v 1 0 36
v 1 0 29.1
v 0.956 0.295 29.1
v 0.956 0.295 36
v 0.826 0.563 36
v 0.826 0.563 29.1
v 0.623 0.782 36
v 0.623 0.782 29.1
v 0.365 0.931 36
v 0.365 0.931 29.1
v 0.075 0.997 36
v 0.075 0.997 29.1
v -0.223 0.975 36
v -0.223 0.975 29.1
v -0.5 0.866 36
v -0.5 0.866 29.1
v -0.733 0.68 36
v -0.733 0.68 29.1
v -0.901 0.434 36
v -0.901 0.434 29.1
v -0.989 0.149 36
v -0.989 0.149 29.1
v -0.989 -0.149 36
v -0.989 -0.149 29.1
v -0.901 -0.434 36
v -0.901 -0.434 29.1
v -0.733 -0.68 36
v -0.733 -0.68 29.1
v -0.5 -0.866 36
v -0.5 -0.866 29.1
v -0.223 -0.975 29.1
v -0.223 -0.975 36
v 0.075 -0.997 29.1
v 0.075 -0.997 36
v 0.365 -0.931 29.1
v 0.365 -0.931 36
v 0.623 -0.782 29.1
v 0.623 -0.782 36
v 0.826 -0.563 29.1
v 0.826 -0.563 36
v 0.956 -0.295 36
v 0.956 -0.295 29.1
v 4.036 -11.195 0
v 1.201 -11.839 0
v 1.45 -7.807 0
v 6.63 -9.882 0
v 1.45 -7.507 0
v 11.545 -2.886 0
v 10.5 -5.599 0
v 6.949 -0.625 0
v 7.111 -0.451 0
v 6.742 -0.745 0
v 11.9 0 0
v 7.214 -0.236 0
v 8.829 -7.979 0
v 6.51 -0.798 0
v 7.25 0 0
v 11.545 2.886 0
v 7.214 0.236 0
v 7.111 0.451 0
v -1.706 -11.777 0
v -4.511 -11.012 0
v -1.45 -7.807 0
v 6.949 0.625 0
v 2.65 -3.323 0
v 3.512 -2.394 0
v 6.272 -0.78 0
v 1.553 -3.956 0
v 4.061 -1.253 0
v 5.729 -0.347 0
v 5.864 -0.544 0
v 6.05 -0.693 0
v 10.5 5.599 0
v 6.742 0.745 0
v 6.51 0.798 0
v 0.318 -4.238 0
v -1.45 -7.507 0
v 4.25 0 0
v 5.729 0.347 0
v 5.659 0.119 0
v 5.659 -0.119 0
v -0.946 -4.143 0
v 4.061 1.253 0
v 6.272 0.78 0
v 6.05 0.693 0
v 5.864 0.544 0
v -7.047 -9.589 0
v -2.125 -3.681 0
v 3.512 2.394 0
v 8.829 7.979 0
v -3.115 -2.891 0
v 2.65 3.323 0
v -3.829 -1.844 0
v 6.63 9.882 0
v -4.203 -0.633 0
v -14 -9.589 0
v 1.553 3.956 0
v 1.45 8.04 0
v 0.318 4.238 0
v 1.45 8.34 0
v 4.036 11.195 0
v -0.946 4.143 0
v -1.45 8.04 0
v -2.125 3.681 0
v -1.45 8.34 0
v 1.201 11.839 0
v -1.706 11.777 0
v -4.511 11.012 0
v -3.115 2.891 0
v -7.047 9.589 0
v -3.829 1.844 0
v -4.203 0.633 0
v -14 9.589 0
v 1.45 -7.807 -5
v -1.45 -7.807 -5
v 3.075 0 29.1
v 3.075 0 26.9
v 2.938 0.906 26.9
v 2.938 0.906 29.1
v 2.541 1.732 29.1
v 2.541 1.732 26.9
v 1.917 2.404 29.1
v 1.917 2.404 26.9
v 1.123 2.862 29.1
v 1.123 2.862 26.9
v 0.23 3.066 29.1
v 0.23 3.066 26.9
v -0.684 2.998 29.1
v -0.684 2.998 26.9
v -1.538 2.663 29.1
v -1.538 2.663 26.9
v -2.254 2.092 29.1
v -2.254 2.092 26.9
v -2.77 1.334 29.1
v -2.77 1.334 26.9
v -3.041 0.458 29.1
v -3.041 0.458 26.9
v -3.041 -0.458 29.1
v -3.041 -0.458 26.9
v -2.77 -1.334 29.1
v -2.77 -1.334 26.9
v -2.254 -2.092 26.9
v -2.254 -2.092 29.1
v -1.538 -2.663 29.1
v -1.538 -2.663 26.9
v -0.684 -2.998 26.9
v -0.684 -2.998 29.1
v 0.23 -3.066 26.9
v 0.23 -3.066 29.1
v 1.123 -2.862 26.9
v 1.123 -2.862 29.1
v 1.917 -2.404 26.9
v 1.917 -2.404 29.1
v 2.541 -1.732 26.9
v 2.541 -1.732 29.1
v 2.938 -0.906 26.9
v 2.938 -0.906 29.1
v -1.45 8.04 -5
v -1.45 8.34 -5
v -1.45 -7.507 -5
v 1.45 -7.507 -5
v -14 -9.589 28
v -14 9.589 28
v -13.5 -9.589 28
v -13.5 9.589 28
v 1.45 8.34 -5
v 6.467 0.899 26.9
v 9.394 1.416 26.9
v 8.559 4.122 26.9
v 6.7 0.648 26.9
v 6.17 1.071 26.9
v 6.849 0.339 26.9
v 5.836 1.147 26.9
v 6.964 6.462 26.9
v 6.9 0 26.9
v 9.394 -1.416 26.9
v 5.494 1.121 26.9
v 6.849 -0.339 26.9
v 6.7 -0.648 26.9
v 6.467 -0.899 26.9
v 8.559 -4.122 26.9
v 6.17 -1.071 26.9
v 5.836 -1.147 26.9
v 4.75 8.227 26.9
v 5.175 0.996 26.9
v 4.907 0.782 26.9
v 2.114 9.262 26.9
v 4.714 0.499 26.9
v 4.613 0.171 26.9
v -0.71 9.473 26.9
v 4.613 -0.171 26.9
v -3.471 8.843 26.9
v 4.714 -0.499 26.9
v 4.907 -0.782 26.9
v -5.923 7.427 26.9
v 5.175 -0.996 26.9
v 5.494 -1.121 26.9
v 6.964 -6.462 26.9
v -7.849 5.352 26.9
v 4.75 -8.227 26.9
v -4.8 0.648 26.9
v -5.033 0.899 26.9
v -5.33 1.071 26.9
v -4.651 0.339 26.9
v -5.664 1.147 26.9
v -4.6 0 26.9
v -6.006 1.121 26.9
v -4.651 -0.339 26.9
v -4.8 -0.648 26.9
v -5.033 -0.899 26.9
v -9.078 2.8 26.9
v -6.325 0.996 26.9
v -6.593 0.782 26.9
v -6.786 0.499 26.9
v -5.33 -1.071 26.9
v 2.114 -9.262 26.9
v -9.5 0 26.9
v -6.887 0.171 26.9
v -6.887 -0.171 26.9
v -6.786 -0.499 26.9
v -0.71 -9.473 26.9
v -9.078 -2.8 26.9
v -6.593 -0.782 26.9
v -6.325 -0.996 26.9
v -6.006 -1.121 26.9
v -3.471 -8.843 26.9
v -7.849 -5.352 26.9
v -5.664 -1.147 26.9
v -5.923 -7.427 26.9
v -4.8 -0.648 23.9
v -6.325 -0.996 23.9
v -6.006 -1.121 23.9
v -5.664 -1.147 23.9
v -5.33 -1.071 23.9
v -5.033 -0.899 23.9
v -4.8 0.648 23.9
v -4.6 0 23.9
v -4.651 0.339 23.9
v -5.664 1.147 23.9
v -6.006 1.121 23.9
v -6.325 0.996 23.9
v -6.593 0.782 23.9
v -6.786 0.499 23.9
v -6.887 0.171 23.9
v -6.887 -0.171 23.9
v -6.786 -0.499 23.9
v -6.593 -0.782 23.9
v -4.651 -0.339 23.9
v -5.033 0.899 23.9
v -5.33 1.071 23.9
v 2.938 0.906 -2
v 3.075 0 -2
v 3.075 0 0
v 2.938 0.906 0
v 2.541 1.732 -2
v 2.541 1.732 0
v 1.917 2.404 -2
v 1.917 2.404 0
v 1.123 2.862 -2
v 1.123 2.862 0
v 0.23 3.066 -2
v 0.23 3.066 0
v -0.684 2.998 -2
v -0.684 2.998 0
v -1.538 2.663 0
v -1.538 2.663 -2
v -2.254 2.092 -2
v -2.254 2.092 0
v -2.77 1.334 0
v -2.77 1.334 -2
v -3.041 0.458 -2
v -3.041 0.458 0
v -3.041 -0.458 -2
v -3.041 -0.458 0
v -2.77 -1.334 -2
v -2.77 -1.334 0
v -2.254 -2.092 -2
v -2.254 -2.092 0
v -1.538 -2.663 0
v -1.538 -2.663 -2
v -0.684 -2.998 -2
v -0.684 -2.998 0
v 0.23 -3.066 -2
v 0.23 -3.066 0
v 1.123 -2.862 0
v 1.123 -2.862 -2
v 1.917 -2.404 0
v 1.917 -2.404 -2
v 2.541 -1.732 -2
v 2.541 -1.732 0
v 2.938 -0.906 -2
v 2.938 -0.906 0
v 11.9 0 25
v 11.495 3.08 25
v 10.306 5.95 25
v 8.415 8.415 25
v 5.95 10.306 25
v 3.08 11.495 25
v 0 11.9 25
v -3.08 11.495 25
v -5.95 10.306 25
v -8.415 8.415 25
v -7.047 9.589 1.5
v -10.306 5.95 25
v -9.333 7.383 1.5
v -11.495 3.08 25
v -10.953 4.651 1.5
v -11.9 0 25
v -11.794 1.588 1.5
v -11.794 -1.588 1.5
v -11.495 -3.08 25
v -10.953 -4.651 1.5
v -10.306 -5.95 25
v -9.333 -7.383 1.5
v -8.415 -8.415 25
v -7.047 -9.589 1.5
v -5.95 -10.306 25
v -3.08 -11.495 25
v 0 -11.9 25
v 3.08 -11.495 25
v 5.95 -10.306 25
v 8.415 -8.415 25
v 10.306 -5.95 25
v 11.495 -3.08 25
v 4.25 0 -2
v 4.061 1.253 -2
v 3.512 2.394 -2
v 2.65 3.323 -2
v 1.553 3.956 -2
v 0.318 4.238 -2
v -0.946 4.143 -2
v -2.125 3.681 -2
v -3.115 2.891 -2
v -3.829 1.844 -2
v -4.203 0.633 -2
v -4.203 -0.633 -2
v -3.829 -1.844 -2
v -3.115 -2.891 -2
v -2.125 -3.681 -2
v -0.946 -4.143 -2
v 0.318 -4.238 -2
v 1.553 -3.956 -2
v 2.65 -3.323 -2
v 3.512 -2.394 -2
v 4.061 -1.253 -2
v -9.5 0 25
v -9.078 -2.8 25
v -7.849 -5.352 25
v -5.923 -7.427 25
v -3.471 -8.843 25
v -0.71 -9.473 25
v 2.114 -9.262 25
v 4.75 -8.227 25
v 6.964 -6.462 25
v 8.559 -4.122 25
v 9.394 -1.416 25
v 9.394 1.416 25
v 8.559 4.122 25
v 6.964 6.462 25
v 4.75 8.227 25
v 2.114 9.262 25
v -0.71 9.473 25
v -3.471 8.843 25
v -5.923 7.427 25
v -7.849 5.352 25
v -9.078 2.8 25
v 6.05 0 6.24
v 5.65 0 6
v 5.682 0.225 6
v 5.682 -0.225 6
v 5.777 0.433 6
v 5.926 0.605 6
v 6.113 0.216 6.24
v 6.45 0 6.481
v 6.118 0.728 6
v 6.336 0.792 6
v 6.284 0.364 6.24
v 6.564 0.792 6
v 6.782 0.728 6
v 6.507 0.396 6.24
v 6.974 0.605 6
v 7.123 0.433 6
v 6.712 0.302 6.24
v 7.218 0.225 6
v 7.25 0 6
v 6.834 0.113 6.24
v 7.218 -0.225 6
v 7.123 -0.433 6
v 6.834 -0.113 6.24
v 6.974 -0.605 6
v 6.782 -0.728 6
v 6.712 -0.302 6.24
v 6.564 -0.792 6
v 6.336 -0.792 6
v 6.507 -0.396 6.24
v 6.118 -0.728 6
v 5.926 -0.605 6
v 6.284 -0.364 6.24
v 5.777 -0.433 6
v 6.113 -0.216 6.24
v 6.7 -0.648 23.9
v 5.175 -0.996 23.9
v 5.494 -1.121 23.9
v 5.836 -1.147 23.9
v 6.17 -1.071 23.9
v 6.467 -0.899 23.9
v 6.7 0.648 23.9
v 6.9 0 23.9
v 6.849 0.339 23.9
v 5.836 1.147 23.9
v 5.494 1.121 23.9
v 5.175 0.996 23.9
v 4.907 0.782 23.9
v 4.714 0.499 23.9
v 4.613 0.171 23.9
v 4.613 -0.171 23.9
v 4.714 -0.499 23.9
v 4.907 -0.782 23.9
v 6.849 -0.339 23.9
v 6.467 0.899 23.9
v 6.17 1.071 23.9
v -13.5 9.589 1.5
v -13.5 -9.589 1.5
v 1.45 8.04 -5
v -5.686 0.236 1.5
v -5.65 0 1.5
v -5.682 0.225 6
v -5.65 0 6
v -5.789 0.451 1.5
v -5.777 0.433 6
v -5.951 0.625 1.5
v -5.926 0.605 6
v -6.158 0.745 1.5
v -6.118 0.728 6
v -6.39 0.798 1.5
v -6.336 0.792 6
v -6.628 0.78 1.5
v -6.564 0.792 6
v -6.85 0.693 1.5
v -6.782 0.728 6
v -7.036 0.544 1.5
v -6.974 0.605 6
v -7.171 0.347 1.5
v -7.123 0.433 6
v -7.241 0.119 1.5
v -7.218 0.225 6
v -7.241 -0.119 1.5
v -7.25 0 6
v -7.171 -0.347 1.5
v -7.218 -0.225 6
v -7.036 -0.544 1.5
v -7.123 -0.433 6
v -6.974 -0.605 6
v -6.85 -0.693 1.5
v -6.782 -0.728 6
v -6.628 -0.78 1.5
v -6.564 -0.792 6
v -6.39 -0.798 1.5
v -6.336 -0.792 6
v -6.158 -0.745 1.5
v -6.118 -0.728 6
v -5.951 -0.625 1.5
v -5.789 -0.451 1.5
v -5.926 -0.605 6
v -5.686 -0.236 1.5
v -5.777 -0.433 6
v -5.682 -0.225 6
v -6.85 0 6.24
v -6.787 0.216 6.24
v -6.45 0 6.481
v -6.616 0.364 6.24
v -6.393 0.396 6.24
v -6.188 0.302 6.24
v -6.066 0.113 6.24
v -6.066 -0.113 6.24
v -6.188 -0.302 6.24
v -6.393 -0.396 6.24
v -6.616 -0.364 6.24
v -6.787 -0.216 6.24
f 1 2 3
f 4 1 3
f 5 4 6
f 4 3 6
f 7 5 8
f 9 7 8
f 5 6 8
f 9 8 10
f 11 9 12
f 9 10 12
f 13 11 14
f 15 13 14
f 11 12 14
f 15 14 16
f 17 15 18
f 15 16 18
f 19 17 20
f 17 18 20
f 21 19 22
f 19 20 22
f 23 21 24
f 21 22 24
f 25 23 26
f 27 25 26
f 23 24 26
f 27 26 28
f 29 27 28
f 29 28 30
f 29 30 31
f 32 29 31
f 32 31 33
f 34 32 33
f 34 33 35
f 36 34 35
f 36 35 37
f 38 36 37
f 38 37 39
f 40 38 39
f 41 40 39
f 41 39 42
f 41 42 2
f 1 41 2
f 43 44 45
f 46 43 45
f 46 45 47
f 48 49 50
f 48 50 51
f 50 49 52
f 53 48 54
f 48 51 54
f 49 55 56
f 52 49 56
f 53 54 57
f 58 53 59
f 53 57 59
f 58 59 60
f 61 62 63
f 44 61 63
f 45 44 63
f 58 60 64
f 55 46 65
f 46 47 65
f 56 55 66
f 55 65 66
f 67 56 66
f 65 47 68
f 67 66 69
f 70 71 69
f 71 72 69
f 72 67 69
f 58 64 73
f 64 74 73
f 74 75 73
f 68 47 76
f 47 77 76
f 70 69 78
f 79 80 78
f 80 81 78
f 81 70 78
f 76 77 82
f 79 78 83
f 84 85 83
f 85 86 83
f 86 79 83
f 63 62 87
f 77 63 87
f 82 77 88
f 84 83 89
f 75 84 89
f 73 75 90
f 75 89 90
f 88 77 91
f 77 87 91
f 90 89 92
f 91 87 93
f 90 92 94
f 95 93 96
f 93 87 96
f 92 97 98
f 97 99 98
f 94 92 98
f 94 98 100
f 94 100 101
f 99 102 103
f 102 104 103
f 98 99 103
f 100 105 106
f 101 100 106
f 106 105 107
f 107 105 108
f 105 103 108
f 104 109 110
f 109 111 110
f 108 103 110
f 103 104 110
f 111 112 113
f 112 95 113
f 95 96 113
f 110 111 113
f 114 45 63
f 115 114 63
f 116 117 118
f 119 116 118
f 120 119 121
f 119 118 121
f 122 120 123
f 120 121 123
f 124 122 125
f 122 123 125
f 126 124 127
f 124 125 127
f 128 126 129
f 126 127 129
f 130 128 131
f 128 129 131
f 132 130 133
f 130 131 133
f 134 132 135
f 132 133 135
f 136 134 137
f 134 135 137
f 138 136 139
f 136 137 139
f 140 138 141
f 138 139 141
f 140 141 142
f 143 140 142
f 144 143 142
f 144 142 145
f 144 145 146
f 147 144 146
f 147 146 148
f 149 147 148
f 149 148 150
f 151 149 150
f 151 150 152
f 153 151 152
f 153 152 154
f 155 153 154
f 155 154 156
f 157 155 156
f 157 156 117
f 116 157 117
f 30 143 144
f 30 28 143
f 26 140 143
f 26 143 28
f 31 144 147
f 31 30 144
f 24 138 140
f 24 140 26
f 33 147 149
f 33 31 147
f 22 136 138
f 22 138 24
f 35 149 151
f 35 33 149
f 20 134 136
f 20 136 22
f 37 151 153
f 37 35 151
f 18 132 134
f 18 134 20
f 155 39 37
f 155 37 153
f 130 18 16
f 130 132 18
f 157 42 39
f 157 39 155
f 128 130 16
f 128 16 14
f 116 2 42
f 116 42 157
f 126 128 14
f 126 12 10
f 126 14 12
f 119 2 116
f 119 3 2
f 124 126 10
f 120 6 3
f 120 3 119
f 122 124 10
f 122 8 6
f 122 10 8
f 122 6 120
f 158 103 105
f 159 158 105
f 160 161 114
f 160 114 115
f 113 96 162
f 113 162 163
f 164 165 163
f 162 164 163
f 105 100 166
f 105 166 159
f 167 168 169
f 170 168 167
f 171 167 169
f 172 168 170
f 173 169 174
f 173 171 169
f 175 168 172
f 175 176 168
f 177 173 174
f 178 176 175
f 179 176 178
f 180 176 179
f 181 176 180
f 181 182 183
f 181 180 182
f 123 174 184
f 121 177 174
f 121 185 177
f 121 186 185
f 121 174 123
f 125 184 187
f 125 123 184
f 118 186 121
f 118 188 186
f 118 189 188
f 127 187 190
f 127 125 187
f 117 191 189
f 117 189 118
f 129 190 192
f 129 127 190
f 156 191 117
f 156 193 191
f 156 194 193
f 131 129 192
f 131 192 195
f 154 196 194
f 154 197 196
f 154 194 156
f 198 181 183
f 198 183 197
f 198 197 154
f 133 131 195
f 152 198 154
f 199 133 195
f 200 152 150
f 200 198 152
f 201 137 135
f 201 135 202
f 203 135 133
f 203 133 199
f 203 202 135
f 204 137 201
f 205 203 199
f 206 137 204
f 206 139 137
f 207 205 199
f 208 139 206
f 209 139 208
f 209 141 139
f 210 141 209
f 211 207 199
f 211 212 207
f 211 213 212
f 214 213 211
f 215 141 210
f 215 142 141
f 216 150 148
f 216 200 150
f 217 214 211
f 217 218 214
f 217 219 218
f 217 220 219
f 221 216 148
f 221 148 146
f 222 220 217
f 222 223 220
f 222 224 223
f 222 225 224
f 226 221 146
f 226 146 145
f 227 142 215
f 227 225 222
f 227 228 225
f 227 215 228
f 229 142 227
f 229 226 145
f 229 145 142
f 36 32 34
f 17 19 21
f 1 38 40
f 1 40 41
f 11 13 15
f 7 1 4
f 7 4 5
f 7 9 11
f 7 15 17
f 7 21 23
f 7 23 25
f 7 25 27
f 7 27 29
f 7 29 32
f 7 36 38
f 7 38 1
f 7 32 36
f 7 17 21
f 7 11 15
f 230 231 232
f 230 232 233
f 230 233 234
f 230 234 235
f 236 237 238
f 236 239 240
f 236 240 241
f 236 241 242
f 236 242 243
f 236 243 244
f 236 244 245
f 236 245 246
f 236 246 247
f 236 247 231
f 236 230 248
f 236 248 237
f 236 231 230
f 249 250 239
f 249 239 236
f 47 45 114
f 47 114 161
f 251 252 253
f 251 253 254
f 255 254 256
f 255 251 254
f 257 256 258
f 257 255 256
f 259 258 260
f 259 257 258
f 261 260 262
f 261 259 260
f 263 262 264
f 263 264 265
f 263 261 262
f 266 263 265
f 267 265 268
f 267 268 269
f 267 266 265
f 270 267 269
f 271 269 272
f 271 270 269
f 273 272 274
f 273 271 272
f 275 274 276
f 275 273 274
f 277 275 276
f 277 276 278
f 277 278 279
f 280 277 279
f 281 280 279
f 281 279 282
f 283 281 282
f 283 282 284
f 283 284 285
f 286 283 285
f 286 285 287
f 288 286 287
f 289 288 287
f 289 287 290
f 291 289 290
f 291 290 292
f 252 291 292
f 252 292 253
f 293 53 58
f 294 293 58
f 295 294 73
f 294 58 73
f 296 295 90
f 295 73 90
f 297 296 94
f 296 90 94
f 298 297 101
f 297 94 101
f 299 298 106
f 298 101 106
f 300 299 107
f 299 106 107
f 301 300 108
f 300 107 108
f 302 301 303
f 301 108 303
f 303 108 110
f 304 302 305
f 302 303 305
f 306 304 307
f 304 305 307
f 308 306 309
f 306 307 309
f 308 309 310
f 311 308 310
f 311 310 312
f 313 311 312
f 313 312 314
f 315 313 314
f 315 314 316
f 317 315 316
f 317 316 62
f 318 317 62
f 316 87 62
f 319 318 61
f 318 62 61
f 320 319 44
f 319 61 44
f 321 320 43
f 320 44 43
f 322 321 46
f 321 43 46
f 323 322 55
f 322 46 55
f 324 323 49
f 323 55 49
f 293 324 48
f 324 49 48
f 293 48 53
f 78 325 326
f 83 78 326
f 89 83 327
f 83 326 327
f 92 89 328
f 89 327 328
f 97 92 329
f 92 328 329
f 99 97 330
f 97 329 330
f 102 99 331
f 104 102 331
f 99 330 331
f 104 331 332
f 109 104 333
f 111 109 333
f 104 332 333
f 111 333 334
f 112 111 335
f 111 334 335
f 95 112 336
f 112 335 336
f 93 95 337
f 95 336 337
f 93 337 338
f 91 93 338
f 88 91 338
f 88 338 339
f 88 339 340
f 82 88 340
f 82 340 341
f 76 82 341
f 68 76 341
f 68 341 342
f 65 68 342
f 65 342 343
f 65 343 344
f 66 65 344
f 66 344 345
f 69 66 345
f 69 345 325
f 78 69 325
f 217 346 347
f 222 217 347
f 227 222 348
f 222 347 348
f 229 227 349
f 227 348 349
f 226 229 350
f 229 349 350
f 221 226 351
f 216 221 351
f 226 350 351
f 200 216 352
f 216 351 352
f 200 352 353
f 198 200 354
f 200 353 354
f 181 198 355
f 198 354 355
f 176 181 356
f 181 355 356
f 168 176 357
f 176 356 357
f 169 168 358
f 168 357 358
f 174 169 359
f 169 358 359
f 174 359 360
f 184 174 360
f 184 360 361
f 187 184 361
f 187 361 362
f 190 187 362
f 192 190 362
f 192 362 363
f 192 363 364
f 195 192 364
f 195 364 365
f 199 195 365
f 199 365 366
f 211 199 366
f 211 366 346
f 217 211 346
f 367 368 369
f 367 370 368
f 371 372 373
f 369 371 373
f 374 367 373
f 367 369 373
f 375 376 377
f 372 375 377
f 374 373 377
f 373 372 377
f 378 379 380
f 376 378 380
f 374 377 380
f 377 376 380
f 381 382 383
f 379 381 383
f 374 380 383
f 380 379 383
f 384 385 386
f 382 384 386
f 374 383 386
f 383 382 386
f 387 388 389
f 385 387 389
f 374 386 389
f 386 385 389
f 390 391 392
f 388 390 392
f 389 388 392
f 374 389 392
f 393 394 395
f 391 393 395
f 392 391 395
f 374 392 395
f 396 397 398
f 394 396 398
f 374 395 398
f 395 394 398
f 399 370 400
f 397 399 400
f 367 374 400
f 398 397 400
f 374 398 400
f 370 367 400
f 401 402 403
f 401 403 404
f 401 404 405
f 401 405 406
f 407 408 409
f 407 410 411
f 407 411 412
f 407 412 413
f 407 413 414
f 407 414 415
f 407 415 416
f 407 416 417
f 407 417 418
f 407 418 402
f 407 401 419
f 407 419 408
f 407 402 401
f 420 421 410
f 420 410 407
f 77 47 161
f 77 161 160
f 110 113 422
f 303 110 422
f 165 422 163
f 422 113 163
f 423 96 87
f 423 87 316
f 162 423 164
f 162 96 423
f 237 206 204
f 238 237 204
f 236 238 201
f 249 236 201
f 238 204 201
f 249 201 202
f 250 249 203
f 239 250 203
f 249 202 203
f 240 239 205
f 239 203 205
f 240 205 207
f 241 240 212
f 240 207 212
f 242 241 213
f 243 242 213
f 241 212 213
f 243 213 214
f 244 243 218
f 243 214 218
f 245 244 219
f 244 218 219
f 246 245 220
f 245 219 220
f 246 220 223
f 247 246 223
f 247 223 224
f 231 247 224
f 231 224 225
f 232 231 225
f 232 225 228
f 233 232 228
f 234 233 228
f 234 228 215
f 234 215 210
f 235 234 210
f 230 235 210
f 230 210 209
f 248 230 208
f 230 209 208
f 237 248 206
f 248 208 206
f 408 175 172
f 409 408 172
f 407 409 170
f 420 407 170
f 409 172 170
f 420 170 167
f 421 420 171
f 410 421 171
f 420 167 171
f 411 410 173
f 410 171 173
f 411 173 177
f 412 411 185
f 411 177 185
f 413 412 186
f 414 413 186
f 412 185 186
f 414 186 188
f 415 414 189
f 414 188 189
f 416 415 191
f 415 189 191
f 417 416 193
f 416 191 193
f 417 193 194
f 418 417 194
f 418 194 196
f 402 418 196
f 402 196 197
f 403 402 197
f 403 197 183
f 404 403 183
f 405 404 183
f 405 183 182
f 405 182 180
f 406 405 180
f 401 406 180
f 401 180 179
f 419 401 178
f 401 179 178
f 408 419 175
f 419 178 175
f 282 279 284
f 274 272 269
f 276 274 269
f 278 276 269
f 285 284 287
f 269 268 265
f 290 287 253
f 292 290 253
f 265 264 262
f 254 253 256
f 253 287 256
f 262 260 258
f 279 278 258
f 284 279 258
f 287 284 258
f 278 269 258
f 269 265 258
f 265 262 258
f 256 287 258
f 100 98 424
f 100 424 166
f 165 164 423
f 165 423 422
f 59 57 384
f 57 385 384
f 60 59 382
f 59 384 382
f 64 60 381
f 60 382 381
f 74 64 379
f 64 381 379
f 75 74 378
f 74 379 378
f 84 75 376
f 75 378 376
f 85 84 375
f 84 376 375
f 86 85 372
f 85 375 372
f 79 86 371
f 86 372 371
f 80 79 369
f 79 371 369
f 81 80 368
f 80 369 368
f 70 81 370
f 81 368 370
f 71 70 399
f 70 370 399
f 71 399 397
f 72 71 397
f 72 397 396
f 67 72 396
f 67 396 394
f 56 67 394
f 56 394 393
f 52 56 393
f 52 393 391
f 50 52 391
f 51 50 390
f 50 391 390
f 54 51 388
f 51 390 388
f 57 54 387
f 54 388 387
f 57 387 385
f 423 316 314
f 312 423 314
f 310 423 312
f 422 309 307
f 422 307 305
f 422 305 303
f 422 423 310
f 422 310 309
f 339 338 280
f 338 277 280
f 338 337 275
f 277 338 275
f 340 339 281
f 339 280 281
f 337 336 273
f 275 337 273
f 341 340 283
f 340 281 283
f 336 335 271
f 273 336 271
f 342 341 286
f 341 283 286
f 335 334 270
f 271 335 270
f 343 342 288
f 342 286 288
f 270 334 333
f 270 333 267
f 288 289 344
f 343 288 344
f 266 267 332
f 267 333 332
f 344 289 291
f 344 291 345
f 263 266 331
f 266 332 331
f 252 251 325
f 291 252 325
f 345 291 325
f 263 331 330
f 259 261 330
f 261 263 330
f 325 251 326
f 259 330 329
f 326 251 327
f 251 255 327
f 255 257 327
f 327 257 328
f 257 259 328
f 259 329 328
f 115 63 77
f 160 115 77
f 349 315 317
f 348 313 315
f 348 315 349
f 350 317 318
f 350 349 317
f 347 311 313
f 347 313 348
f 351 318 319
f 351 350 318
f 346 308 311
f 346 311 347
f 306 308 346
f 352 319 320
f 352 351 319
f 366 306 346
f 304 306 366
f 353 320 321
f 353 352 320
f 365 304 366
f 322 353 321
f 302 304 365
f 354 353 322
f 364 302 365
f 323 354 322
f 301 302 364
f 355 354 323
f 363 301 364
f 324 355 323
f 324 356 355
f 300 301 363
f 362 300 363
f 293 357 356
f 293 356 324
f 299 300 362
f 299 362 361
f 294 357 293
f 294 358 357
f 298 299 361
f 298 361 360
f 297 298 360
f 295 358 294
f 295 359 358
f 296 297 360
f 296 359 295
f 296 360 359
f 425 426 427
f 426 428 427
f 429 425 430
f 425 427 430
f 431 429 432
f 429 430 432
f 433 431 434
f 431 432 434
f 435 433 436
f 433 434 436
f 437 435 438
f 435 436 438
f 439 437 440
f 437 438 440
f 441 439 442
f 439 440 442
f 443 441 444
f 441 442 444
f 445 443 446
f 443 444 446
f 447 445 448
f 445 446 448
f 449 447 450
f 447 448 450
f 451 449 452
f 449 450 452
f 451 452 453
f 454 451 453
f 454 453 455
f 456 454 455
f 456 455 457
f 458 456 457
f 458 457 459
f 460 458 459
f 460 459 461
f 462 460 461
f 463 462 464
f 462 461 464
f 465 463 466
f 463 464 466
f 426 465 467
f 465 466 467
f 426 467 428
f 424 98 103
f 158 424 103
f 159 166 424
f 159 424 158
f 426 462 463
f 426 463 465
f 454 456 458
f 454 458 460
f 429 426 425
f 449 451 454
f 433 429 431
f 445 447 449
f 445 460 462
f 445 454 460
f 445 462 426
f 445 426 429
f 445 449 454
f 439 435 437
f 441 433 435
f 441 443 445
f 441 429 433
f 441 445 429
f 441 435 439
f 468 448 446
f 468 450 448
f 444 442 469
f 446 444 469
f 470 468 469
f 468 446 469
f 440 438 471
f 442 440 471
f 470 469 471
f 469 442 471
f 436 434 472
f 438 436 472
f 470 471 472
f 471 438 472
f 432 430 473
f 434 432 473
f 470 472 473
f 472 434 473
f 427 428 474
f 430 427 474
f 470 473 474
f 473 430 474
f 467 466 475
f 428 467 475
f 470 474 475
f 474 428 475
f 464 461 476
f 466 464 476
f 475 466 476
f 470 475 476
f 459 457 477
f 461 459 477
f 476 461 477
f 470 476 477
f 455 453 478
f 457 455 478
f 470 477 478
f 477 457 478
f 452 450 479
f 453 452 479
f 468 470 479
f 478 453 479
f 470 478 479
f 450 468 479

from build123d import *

# Parameters (mm, degrees)
SKETCH_2_R             = 1
EXTRUDE_1_DEPTH        = 36
SKETCH_2_4_R           = 3.075
SKETCH_2_4_R_2         = 1
EXTRUDE_2_DEPTH        = 29.1
EXTRUDE_3_DEPTH        = 26.9
EXTRUDE_3_DEPTH_BACK   = 2
SKETCH_2_5_R           = 4.25
SKETCH_2_5_R_2         = 3.075
SKETCH_2_6_R           = 9.5
SKETCH_2_6_R_2         = 4.25
EXTRUDE_4_DEPTH        = 26.9
SKETCH_2_7_R           = 11.9
SKETCH_2_7_R_2         = 9.5
EXTRUDE_5_DEPTH        = 25
SKETCH_5_W             = 2.9
SKETCH_5_H             = 0.3
EXTRUDE_6_DEPTH        = 5
HOLE_WIZARD_M2_2_D     = 1.6
HOLE_WIZARD_M2_2_DEPTH = 6
HOLE_WIZARD_M2_2_TIP   = 0.480688495
SKETCH_14_R            = 1.15
CUT_EXTRUDE_1_DEPTH    = 3
SKETCH_15_W            = 0.5
SKETCH_15_H            = 19.17801297
EXTRUDE_7_DEPTH        = 28
SKETCH_17_W            = 1.5
SKETCH_17_H            = 19.17801297
EXTRUDE_9_DEPTH        = 10


with BuildPart() as part:
    # ｽｹｯﾁ2 → ﾎﾞｽ - 押し出し1 (new body)
    with BuildSketch(Plane.XY):
        Circle(SKETCH_2_R)
    extrude(amount=EXTRUDE_1_DEPTH)

    # ｽｹｯﾁ2<4> → ﾎﾞｽ - 押し出し2 (add)
    with BuildSketch(Plane.XY):
        Circle(SKETCH_2_4_R)
        Circle(SKETCH_2_4_R_2, mode=Mode.SUBTRACT)
    extrude(amount=EXTRUDE_2_DEPTH)

    # ｽｹｯﾁ2<5> → ﾎﾞｽ - 押し出し3 (add, two sides: drawn at the far end of the back side and taken through both)
    with BuildSketch(Plane.XY.offset(-EXTRUDE_3_DEPTH_BACK)):
        Circle(SKETCH_2_5_R)
        Circle(SKETCH_2_5_R_2, mode=Mode.SUBTRACT)
    extrude(amount=EXTRUDE_3_DEPTH + EXTRUDE_3_DEPTH_BACK)

    # ｽｹｯﾁ2<6> → ﾎﾞｽ - 押し出し4 (add)
    with BuildSketch(Plane.XY):
        Circle(SKETCH_2_6_R)
        Circle(SKETCH_2_6_R_2, mode=Mode.SUBTRACT)
    extrude(amount=EXTRUDE_4_DEPTH)

    # ｽｹｯﾁ2<7> → ﾎﾞｽ - 押し出し5 (add)
    with BuildSketch(Plane.XY):
        Circle(SKETCH_2_7_R)
        Circle(SKETCH_2_7_R_2, mode=Mode.SUBTRACT)
    extrude(amount=EXTRUDE_5_DEPTH)

    # ｽｹｯﾁ5 → ﾎﾞｽ - 押し出し6 (add)
    with BuildSketch(Plane(origin=(0, 0, 0), x_dir=(-1, 0, 0), z_dir=(0, 0, -1))):
        with Locations((0, -7.656829655)):
            Rectangle(SKETCH_5_W, SKETCH_5_H)
        with Locations((0, 8.189714354)):
            Rectangle(SKETCH_5_W, SKETCH_5_H)
    extrude(amount=EXTRUDE_6_DEPTH)

    # M2 ねじ穴2
    with Locations(Plane(origin=(0, 0, 0), x_dir=(-1, 0, 0), z_dir=(0, 0, -1))):
        with Locations((-6.45, 0), (6.45, 0)):
            Hole(HOLE_WIZARD_M2_2_D / 2, depth=HOLE_WIZARD_M2_2_DEPTH)
            with Locations((0, 0, -(HOLE_WIZARD_M2_2_DEPTH + HOLE_WIZARD_M2_2_TIP / 2))):  # 118° drill point
                Cone(0, HOLE_WIZARD_M2_2_D / 2, HOLE_WIZARD_M2_2_TIP, mode=Mode.SUBTRACT)

    # ｽｹｯﾁ14 → ｶｯﾄ - 押し出し1 (cut)
    with BuildSketch(Plane.XY.offset(26.9)):
        with Locations((5.75, 0)):
            Circle(SKETCH_14_R)
        with Locations((-5.75, 0)):
            Circle(SKETCH_14_R)
    extrude(amount=-CUT_EXTRUDE_1_DEPTH, mode=Mode.SUBTRACT)



with BuildPart() as body_2:
    # ｽｹｯﾁ15 → ﾎﾞｽ - 押し出し7 (new body)
    with BuildSketch(Plane(origin=(0, 0, 0), x_dir=(-1, 0, 0), z_dir=(0, 0, -1))):
        with Locations((13.75, 0)):
            Rectangle(SKETCH_15_W, SKETCH_15_H)
    extrude(amount=-EXTRUDE_7_DEPTH)


with BuildPart() as part_1:
    add(part.part)

    add(body_2.part)  # ﾎﾞｽ - 押し出し9 merges body 2
    # ｽｹｯﾁ17 → ﾎﾞｽ - 押し出し9 (add)
    with BuildSketch(Plane.ZY.offset(14)):
        with Locations((0.75, 0)):
            Rectangle(SKETCH_17_W, SKETCH_17_H)
    extrude(amount=-EXTRUDE_9_DEPTH)


solid = part_1.part
